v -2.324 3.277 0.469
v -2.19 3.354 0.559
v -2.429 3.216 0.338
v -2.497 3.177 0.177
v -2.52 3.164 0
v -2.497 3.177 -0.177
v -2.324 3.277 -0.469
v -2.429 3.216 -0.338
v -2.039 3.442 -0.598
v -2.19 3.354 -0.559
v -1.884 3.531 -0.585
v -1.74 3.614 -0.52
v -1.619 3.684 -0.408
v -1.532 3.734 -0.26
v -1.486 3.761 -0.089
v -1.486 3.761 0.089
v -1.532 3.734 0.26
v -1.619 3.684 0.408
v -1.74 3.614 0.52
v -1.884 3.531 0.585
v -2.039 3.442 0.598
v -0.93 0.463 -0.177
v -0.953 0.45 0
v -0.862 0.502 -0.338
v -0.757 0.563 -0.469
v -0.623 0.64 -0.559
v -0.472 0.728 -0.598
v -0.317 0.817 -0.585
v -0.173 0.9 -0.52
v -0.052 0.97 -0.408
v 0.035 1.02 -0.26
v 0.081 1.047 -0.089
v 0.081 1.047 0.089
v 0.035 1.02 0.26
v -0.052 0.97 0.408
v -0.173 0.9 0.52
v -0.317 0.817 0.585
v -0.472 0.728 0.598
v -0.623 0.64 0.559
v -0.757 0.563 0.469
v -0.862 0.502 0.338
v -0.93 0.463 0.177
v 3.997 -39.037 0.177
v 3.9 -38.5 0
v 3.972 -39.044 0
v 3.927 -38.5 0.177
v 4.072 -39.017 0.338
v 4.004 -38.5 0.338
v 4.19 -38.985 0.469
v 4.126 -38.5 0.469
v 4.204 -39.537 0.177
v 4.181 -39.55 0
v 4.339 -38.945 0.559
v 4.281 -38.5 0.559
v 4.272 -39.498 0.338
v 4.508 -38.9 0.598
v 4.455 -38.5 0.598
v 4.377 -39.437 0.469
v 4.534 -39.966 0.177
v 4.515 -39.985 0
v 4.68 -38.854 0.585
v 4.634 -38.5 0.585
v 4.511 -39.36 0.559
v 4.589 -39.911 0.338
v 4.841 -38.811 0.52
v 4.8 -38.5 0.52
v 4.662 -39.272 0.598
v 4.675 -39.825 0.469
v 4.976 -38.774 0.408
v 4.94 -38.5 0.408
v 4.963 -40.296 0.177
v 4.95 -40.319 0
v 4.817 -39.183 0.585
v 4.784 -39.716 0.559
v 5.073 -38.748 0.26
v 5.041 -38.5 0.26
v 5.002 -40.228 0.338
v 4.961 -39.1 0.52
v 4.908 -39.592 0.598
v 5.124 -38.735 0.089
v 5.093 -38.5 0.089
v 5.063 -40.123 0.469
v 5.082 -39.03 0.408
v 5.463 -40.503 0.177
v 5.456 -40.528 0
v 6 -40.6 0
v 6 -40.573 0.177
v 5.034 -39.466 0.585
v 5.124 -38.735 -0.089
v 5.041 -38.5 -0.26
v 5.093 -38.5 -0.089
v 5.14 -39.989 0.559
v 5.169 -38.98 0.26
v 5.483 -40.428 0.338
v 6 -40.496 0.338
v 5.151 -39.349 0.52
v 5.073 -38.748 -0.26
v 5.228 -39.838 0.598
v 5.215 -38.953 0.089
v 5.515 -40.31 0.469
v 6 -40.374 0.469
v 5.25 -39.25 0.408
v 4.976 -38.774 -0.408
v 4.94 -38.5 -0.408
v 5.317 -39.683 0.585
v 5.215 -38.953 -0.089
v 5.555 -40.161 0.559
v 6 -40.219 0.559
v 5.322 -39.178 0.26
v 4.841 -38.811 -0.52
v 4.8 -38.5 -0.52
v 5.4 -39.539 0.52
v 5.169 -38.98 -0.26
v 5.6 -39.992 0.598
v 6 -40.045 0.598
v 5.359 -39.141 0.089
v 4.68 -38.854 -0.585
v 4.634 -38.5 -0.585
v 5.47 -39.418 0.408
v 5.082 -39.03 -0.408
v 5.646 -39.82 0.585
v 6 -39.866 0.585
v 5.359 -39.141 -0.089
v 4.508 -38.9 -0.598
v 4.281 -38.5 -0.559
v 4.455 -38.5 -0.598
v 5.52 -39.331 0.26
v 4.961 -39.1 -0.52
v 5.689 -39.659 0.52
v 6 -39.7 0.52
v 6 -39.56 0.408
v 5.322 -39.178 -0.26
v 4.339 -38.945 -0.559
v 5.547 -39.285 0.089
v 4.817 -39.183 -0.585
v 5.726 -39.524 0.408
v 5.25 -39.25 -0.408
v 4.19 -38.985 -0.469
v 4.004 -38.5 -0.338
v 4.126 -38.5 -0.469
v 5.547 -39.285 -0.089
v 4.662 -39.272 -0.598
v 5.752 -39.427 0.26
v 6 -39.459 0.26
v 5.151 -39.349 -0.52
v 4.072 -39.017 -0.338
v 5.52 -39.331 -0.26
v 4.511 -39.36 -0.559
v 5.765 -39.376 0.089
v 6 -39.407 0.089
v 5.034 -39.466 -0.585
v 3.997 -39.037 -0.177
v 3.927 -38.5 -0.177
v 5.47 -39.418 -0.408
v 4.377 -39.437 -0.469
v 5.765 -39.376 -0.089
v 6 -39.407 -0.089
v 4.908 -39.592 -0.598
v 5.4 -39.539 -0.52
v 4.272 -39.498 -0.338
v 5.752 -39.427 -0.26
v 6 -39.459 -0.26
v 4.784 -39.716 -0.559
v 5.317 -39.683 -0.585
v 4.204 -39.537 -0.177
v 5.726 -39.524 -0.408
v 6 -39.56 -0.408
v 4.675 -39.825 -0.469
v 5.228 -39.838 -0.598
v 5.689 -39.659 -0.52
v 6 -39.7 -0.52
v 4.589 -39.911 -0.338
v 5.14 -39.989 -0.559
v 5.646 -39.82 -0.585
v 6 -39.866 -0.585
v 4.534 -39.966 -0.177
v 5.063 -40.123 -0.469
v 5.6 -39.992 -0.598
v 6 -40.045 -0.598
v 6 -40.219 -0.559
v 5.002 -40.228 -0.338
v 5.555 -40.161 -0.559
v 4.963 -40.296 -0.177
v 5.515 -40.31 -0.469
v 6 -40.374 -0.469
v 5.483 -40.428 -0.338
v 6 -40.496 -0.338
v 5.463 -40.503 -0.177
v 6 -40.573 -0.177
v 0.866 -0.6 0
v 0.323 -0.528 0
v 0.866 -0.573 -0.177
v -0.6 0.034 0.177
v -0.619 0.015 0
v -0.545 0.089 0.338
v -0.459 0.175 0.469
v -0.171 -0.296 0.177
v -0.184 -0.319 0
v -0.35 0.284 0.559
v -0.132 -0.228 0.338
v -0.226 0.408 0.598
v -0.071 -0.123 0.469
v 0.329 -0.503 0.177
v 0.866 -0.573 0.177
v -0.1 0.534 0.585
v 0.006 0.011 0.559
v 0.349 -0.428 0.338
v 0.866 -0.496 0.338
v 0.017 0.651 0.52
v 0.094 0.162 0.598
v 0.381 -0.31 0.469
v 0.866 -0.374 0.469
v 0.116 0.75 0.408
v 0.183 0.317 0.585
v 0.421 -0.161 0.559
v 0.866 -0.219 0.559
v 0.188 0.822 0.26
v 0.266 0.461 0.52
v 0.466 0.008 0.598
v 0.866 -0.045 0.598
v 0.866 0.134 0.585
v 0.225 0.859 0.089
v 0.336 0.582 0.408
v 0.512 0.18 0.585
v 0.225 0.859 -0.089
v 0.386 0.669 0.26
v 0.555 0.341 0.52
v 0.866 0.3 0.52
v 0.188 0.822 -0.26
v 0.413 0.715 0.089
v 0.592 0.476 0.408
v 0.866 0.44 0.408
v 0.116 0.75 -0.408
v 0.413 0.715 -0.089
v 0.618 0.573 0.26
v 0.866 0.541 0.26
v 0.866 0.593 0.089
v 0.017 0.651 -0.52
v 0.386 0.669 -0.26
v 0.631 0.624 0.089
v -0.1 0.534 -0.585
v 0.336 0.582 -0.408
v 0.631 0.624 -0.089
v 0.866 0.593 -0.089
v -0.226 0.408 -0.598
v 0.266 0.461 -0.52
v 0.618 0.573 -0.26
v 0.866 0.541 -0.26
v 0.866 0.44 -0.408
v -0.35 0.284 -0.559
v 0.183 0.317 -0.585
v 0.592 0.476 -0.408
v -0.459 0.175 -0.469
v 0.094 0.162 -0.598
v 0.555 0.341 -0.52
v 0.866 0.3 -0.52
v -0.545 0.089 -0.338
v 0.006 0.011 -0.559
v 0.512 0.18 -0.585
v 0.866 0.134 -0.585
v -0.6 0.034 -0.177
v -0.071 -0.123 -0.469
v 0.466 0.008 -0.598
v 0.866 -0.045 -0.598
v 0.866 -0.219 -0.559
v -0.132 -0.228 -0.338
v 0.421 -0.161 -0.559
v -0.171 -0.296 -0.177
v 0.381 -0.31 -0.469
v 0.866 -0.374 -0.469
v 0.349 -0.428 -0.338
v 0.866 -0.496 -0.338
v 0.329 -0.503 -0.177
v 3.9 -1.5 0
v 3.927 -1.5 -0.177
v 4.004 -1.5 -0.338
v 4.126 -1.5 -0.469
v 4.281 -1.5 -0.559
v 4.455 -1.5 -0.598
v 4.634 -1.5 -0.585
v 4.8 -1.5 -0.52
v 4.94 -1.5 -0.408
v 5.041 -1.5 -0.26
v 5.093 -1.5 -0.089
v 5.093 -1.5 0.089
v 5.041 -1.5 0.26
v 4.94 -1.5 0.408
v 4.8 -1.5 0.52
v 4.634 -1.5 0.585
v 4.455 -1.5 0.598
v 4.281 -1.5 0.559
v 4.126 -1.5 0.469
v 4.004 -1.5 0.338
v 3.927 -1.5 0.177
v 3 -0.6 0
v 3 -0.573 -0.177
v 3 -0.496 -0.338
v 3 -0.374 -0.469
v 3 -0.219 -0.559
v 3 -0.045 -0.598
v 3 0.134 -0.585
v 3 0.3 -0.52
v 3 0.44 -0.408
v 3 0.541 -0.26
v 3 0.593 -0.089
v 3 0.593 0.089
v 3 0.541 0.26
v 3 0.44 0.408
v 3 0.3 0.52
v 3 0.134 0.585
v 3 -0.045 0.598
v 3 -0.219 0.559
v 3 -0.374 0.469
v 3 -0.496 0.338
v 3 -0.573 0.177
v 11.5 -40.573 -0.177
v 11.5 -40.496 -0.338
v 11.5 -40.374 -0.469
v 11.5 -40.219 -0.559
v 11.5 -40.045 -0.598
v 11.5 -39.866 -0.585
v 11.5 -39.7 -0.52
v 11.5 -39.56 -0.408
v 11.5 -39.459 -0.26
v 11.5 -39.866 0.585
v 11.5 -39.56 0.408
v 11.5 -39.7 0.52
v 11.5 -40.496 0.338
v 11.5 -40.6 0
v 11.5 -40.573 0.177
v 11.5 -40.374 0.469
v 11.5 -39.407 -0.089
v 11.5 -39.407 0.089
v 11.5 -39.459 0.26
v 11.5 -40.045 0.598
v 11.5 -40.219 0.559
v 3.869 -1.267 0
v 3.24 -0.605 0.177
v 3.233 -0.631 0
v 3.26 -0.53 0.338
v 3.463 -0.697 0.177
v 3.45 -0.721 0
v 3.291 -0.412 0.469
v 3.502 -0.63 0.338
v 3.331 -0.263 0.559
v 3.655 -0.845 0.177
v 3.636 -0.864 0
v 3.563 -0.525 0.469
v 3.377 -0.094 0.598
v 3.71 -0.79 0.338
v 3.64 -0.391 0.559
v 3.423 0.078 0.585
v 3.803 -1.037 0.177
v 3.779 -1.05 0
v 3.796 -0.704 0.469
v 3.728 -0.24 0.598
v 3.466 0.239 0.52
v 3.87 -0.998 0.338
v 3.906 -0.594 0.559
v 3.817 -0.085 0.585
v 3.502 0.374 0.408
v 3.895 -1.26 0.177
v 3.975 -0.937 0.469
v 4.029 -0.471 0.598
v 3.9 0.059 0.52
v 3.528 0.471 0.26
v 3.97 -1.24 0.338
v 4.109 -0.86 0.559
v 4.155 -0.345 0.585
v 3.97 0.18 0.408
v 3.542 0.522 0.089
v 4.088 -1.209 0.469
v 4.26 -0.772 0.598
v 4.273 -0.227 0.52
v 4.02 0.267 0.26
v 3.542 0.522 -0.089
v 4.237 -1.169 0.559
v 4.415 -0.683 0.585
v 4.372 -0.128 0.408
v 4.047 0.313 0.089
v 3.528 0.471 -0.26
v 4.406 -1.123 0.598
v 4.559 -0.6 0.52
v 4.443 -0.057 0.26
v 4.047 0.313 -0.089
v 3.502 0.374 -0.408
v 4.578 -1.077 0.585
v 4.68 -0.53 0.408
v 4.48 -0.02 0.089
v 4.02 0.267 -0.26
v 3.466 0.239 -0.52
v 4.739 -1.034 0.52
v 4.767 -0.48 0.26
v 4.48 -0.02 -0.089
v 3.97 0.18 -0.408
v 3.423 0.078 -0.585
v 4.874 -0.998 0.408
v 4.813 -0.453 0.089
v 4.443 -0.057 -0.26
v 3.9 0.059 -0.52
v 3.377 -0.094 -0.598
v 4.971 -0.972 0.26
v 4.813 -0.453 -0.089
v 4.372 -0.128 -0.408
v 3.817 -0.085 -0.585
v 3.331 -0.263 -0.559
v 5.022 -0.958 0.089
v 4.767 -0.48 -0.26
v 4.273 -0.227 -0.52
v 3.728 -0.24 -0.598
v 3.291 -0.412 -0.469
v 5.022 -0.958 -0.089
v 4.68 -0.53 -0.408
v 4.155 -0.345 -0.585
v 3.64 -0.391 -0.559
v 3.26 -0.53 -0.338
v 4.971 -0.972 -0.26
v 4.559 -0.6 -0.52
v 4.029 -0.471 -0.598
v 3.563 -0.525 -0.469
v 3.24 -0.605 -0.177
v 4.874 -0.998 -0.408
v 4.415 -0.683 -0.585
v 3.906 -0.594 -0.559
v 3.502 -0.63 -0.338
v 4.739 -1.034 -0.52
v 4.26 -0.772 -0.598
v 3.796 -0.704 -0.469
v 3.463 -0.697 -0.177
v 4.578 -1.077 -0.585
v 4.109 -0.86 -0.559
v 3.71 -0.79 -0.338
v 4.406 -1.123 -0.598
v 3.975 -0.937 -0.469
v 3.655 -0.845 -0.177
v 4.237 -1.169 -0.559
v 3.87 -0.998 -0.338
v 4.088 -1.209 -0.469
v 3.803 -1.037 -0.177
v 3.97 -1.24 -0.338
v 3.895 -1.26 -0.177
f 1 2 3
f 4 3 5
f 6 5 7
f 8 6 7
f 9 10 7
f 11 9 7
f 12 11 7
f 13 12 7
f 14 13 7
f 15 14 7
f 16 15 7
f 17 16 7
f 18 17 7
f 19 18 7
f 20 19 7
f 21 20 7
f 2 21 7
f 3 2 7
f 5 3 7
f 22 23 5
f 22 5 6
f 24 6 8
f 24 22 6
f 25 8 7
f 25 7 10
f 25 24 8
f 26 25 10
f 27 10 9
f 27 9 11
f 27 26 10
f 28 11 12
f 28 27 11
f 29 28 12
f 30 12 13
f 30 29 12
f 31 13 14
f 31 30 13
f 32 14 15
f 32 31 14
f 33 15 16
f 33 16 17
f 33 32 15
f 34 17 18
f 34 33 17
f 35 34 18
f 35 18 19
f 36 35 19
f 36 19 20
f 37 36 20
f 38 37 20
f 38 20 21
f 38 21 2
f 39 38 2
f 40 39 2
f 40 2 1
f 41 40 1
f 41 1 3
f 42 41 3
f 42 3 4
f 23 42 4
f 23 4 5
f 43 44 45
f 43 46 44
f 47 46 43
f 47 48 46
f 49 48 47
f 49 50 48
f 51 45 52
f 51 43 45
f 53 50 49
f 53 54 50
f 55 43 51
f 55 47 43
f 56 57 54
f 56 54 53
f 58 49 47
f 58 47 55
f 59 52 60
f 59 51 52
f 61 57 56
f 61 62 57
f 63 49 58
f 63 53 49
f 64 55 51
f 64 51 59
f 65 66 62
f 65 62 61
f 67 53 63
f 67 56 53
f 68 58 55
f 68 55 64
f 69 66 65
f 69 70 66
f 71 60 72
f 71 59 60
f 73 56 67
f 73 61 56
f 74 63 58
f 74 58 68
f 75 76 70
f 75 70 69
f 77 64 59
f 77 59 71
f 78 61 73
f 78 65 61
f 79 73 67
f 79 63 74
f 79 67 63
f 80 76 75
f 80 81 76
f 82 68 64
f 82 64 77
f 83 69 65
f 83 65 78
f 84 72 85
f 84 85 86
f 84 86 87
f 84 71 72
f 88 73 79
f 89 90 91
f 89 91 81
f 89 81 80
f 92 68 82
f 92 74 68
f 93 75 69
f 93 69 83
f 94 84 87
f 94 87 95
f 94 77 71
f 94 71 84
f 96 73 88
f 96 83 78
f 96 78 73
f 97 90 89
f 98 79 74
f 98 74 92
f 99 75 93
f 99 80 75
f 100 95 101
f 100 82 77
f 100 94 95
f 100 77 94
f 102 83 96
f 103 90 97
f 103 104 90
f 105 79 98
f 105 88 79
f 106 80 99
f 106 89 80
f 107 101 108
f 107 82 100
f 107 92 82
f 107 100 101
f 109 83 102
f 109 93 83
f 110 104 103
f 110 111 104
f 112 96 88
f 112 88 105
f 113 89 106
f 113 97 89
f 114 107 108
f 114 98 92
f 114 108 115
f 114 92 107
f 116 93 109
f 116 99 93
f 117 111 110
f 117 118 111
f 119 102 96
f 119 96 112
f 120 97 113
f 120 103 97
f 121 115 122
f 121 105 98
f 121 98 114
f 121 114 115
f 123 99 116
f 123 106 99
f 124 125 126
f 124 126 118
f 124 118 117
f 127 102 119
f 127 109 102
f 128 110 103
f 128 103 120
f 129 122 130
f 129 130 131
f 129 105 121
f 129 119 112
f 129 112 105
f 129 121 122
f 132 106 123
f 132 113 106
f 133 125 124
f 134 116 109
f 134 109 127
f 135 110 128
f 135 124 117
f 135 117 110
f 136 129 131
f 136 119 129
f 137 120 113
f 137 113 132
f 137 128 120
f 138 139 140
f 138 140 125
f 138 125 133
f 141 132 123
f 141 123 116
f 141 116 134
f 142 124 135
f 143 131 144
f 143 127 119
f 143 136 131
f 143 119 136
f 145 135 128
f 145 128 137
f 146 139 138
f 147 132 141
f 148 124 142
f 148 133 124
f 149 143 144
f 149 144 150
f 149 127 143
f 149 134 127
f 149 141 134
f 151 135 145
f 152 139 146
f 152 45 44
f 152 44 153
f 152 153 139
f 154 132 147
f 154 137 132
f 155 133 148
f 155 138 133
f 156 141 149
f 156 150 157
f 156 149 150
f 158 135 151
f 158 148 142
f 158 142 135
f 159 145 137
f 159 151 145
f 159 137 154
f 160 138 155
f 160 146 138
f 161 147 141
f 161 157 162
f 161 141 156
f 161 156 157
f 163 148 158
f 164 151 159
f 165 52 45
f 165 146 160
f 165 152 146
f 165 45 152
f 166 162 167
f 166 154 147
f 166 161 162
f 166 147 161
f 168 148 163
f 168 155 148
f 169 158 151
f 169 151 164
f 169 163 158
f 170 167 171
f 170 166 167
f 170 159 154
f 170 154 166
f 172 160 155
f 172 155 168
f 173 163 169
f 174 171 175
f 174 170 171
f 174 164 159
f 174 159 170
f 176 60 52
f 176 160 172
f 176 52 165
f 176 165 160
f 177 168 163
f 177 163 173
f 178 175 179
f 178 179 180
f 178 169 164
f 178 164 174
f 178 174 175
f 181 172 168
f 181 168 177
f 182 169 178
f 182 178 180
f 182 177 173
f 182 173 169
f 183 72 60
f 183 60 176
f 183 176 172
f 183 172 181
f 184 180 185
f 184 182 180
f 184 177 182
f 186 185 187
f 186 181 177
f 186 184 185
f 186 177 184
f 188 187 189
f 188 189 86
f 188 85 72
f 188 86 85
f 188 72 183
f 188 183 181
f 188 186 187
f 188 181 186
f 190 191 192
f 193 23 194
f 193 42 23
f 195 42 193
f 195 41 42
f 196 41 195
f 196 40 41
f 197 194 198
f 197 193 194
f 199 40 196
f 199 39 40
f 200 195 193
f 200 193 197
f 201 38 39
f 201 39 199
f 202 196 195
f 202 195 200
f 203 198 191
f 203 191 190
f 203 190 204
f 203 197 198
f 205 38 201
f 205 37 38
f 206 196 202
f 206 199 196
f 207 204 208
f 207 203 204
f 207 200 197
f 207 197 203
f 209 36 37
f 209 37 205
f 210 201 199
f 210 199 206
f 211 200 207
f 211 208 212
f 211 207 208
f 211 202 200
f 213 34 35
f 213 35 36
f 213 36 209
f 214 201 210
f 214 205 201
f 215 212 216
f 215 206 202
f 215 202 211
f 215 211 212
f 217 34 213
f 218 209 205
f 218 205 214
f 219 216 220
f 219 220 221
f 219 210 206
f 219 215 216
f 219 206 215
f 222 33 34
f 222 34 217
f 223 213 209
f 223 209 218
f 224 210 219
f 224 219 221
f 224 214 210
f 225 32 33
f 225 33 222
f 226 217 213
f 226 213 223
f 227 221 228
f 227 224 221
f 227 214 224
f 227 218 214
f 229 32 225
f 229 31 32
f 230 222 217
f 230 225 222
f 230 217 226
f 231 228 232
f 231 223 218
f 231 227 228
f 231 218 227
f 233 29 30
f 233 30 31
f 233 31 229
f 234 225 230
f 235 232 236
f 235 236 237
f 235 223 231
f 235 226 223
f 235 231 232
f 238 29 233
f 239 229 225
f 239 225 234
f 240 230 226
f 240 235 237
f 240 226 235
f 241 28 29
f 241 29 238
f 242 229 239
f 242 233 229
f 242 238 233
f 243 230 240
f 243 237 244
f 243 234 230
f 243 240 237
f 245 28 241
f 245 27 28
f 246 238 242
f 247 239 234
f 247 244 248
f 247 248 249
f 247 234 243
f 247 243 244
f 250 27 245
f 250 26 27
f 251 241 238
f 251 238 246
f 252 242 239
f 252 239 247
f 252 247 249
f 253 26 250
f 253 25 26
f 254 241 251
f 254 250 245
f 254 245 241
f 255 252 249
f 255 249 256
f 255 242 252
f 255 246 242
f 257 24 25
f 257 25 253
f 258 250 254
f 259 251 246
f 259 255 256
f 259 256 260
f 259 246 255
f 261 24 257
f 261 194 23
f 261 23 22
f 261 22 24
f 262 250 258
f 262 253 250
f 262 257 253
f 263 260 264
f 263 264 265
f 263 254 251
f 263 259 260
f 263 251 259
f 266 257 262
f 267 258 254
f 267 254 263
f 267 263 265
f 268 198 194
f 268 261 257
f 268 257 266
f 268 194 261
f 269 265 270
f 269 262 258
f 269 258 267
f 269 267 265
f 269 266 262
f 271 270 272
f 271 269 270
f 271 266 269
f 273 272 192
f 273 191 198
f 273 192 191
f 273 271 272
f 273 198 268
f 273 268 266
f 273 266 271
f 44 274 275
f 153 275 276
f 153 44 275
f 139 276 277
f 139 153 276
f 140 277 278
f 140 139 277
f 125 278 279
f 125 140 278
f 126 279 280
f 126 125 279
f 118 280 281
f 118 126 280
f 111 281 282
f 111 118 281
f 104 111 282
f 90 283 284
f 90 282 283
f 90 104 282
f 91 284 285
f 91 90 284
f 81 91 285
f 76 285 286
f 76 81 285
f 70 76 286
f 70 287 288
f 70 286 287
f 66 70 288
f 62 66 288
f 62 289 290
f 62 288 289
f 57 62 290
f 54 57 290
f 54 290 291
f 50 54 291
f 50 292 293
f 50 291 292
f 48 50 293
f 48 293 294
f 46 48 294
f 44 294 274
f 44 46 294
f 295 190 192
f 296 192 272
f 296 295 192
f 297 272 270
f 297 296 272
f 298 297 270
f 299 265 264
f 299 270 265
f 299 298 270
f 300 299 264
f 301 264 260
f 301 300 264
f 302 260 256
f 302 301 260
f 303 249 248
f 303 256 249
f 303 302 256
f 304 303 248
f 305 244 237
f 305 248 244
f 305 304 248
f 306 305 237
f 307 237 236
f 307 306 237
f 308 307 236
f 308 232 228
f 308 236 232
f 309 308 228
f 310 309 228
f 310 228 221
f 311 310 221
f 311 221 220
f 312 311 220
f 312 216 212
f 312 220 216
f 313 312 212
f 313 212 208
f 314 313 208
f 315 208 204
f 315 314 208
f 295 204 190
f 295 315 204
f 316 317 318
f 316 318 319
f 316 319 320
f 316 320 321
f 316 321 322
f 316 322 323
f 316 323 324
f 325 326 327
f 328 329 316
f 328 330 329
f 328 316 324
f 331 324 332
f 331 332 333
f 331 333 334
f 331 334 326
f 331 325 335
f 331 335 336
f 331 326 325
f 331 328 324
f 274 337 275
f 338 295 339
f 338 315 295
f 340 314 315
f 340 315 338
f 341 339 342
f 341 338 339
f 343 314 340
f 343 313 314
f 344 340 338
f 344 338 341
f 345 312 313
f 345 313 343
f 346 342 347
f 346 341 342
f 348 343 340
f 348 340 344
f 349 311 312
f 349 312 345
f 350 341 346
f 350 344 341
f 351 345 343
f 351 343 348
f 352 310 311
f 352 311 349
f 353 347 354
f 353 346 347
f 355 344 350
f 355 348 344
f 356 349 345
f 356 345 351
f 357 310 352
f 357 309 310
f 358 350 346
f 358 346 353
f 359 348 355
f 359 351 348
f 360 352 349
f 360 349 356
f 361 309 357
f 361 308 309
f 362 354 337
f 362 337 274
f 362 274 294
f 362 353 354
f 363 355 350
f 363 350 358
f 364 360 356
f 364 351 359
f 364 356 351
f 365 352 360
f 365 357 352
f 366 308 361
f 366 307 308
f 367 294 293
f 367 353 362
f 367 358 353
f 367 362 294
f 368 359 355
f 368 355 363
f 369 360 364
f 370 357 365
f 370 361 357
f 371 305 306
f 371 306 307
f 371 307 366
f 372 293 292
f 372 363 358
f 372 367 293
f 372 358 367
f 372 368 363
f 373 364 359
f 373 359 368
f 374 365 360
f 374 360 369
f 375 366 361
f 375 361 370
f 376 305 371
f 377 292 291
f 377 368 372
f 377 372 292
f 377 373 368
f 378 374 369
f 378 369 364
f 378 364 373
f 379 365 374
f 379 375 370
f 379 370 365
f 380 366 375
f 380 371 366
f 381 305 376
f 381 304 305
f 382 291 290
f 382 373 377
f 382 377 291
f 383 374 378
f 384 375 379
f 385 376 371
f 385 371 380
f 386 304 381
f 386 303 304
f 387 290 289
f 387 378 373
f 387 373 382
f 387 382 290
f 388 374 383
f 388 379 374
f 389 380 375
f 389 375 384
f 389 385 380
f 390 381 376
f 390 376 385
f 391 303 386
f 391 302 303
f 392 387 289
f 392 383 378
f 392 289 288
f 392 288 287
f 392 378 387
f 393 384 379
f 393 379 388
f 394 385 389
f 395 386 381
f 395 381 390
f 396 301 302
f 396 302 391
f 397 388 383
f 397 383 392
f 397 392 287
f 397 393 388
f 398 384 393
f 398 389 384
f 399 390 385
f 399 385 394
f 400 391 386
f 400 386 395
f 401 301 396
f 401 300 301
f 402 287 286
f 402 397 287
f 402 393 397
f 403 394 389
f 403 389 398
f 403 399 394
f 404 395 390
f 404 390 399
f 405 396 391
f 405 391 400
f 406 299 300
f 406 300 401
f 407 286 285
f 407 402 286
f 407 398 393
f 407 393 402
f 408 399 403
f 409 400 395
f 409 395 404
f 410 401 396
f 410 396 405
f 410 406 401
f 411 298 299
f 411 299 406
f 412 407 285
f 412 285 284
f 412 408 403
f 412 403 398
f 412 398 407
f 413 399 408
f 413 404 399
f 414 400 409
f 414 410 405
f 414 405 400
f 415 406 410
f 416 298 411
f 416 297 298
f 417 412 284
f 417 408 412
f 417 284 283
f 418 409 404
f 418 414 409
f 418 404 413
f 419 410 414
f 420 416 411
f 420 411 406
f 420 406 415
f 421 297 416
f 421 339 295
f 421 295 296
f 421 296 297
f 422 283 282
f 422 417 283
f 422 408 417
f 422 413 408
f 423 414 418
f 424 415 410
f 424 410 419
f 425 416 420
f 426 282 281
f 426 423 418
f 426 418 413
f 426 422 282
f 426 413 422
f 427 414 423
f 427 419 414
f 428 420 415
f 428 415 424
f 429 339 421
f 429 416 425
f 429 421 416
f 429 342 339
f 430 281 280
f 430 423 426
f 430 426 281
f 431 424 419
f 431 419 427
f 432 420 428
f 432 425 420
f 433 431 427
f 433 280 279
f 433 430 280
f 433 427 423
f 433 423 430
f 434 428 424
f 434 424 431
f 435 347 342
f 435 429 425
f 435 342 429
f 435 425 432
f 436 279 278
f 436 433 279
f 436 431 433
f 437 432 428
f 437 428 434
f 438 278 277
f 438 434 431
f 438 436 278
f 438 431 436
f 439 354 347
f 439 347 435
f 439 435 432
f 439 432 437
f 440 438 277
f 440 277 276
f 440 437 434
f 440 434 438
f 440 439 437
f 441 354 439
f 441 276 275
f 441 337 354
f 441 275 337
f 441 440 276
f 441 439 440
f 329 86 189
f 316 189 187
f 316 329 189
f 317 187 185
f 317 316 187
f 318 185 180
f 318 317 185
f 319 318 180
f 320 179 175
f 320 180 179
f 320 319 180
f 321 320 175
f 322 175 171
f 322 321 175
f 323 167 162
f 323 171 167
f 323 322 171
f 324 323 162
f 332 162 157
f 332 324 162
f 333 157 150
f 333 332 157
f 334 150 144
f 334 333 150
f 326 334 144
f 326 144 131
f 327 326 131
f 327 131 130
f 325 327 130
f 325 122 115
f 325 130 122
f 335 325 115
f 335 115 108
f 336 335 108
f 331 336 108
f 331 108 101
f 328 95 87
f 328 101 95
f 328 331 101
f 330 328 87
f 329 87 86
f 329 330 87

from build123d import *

# Parameters (mm, degrees)
SWEEP_1_PROFILE_R = 0.6


with BuildPart() as part:
    # 扫描1: sweep along a path in 草图1
    with BuildLine(Plane.XY) as sweep_1_path:
        Line((-2, 3.464101615), (-0.433012702, 0.75))
        ThreePointArc((-0.433012702, 0.75), (0.116025404, 0.200961894), (0.866025404, 0))
        Line((0.866025404, 0), (3, 0))
        ThreePointArc((3, 0), (4.060660172, -0.439339828), (4.5, -1.5))
        Line((4.5, -1.5), (4.5, -38.5))
        ThreePointArc((4.5, -38.5), (4.939339828, -39.560660172), (6, -40))
        Line((6, -40), (11.5, -40))
    # 扫描1 profile (on start of the path) → 扫描1 (sweep)
    with BuildSketch(Plane(origin=(-2, 3.464101615, 0), x_dir=(-0.8660254037844379, -0.5000000000000013, 0), z_dir=(0.5000000000000013, -0.8660254037844379, 0))):
        Circle(SWEEP_1_PROFILE_R)
    sweep(path=sweep_1_path.line)


solid = part.part
